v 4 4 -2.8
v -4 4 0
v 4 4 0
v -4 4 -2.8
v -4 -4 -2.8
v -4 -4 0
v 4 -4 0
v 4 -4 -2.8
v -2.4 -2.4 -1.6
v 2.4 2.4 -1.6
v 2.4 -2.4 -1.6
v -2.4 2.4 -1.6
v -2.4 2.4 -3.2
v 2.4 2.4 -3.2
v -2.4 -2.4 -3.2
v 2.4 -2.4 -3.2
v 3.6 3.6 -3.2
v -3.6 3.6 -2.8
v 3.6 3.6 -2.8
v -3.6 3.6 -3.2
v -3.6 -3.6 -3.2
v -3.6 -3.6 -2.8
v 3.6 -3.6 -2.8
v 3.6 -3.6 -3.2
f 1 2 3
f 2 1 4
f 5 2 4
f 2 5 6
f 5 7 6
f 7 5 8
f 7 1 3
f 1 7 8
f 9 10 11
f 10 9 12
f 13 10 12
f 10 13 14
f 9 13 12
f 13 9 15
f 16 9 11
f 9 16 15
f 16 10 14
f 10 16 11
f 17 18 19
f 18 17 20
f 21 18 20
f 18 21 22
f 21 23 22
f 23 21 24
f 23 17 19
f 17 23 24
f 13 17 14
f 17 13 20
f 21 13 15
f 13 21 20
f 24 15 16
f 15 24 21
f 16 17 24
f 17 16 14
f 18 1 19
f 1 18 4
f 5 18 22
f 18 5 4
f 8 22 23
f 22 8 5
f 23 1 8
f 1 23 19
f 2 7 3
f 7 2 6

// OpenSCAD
// file: ../p/box5.scad
use <../lib.scad>
function ldraw_lib__box5() = [
// 0 Box with 5 Faces and All Edges
// 0 Name: box5.dat
// 0 Author: James Jessiman
// 0 !LDRAW_ORG Primitive UPDATE 2012-01
// 0 !LICENSE Licensed under CC BY 4.0 : see CAreadme.txt
// 
// 0 BFC CERTIFY CCW
  [0,"BFC","CERTIFY"],
  [0,"BFC","CCW"],
// 
// 0 !HISTORY 2002-04-03 [sbliss] Modified for BFC compliance
// 0 !HISTORY 2002-04-25 [PTadmin] Official Update 2002-02
// 0 !HISTORY 2007-06-24 [PTadmin] Header formatted for Contributor Agreement
// 0 !HISTORY 2008-07-01 [PTadmin] Official Update 2008-01
// 0 !HISTORY 2012-02-16 [Philo] Changed to CCW
// 0 !HISTORY 2012-03-30 [PTadmin] Official Update 2012-01
// 
// 
// 2 24 1 1 1 -1 1 1
  [2,24,1,1,1,-1,1,1],
// 2 24 -1 1 1 -1 1 -1
  [2,24,-1,1,1,-1,1,-1],
// 2 24 -1 1 -1 1 1 -1
  [2,24,-1,1,-1,1,1,-1],
// 2 24 1 1 -1 1 1 1
  [2,24,1,1,-1,1,1,1],
// 2 24 1 0 1 -1 0 1
  [2,24,1,0,1,-1,0,1],
// 2 24 -1 0 1 -1 0 -1
  [2,24,-1,0,1,-1,0,-1],
// 2 24 -1 0 -1 1 0 -1
  [2,24,-1,0,-1,1,0,-1],
// 2 24 1 0 -1 1 0 1
  [2,24,1,0,-1,1,0,1],
// 2 24 1 0 1 1 1 1
  [2,24,1,0,1,1,1,1],
// 2 24 -1 0 1 -1 1 1
  [2,24,-1,0,1,-1,1,1],
// 2 24 1 0 -1 1 1 -1
  [2,24,1,0,-1,1,1,-1],
// 2 24 -1 0 -1 -1 1 -1
  [2,24,-1,0,-1,-1,1,-1],
// 4 16 -1 1 1 1 1 1 1 1 -1 -1 1 -1
  [4,16,-1,1,1,1,1,1,1,1,-1,-1,1,-1],
// 4 16 -1 1 1 -1 0 1 1 0 1 1 1 1
  [4,16,-1,1,1,-1,0,1,1,0,1,1,1,1],
// 4 16 -1 1 -1 -1 0 -1 -1 0 1 -1 1 1
  [4,16,-1,1,-1,-1,0,-1,-1,0,1,-1,1,1],
// 4 16 1 1 -1 1 0 -1 -1 0 -1 -1 1 -1
  [4,16,1,1,-1,1,0,-1,-1,0,-1,-1,1,-1],
// 4 16 1 1 1 1 0 1 1 0 -1 1 1 -1
  [4,16,1,1,1,1,0,1,1,0,-1,1,1,-1],
];
module ldraw_lib__box5(step=0, col=false, unit=2/5, alt=false, line=0.2, solid=!$preview)
    makepoly(ldraw_lib__box5(), step=step, col=col, unit=unit, alt=alt, line=line, solid=solid);
ldraw_lib__box5(line=0.2);
// file: ../p/box4.scad
use <../lib.scad>
function ldraw_lib__box4() = [
// 0 Box with 4 Faces (2 Parallel Pairs) and All Edges
// 0 Name: box4.dat
// 0 Author: James Jessiman
// 0 !LDRAW_ORG Primitive UPDATE 2012-01
// 0 !LICENSE Licensed under CC BY 4.0 : see CAreadme.txt
// 
// 0 BFC CERTIFY CCW
  [0,"BFC","CERTIFY"],
  [0,"BFC","CCW"],
// 
// 0 !HISTORY 2002-04-03 [sbliss] Modified for BFC compliance
// 0 !HISTORY 2002-04-25 [PTadmin] Official Update 2002-02
// 0 !HISTORY 2007-06-24 [PTadmin] Header formatted for Contributor Agreement
// 0 !HISTORY 2008-07-01 [PTadmin] Official Update 2008-01
// 0 !HISTORY 2012-02-16 [Philo] Changed to CCW
// 0 !HISTORY 2012-03-30 [PTadmin] Official Update 2012-01
// 
// 
// 2 24 1 1 1 -1 1 1
  [2,24,1,1,1,-1,1,1],
// 2 24 -1 1 1 -1 1 -1
  [2,24,-1,1,1,-1,1,-1],
// 2 24 -1 1 -1 1 1 -1
  [2,24,-1,1,-1,1,1,-1],
// 2 24 1 1 -1 1 1 1
  [2,24,1,1,-1,1,1,1],
// 2 24 1 0 1 -1 0 1
  [2,24,1,0,1,-1,0,1],
// 2 24 -1 0 1 -1 0 -1
  [2,24,-1,0,1,-1,0,-1],
// 2 24 -1 0 -1 1 0 -1
  [2,24,-1,0,-1,1,0,-1],
// 2 24 1 0 -1 1 0 1
  [2,24,1,0,-1,1,0,1],
// 2 24 1 0 1 1 1 1
  [2,24,1,0,1,1,1,1],
// 2 24 -1 0 1 -1 1 1
  [2,24,-1,0,1,-1,1,1],
// 2 24 1 0 -1 1 1 -1
  [2,24,1,0,-1,1,1,-1],
// 2 24 -1 0 -1 -1 1 -1
  [2,24,-1,0,-1,-1,1,-1],
// 4 16 -1 1 1 -1 0 1 1 0 1 1 1 1
  [4,16,-1,1,1,-1,0,1,1,0,1,1,1,1],
// 4 16 -1 1 -1 -1 0 -1 -1 0 1 -1 1 1
  [4,16,-1,1,-1,-1,0,-1,-1,0,1,-1,1,1],
// 4 16 1 1 -1 1 0 -1 -1 0 -1 -1 1 -1
  [4,16,1,1,-1,1,0,-1,-1,0,-1,-1,1,-1],
// 4 16 1 1 1 1 0 1 1 0 -1 1 1 -1
  [4,16,1,1,1,1,0,1,1,0,-1,1,1,-1],
];
module ldraw_lib__box4(step=0, col=false, unit=2/5, alt=false, line=0.2, solid=!$preview)
    makepoly(ldraw_lib__box4(), step=step, col=col, unit=unit, alt=alt, line=line, solid=solid);
ldraw_lib__box4(line=0.2);
// file: s/3070bs01.scad
use <../../lib.scad>
use <../../p/box4.scad>
use <../../p/box5.scad>
function ldraw_lib__s__3070bs01() = [
// 0 ~Tile  1 x  1 with Groove without Top Face
// 0 Name: s\3070bs01.dat
// 0 Author: Chris Dee [cwdee]
// 0 !LDRAW_ORG Subpart UPDATE 2009-02
// 0 !LICENSE Licensed under CC BY 4.0 : see CAreadme.txt
// 
// 0 BFC CERTIFY CCW
  [0,"BFC","CERTIFY"],
  [0,"BFC","CCW"],
// 
// 0 !HISTORY 2009-09-03 [PTadmin] Official Update 2009-02
// 
// 
// 1 16 0 0 0 10 0 0 0 7 0 0 0 10 box4.dat
  [1,16,0,0,0,10,0,0,0,7,0,0,0,10, ldraw_lib__box4()],
// 0 BFC INVERTNEXT
  [0,"BFC","INVERTNEXT"],
// 1 16 0 8 0 6 0 0 0 -4 0 0 0 6 box5.dat
  [1,16,0,8,0,6,0,0,0,-4,0,0,0,6, ldraw_lib__box5()],
// 1 16 0 7 0 9 0 0 0 1 0 0 0 9 box4.dat
  [1,16,0,7,0,9,0,0,0,1,0,0,0,9, ldraw_lib__box4()],
// 
// 4 16 9 8 9 6 8 6 -6 8 6 -9 8 9
  [4,16,9,8,9,6,8,6,-6,8,6,-9,8,9],
// 4 16 -9 8 9 -6 8 6 -6 8 -6 -9 8 -9
  [4,16,-9,8,9,-6,8,6,-6,8,-6,-9,8,-9],
// 4 16 -9 8 -9 -6 8 -6 6 8 -6 9 8 -9
  [4,16,-9,8,-9,-6,8,-6,6,8,-6,9,8,-9],
// 4 16 9 8 -9 6 8 -6 6 8 6 9 8 9
  [4,16,9,8,-9,6,8,-6,6,8,6,9,8,9],
// 
// 4 16 10 7 10 9 7 9 -9 7 9 -10 7 10
  [4,16,10,7,10,9,7,9,-9,7,9,-10,7,10],
// 4 16 -10 7 10 -9 7 9 -9 7 -9 -10 7 -10
  [4,16,-10,7,10,-9,7,9,-9,7,-9,-10,7,-10],
// 4 16 -10 7 -10 -9 7 -9 9 7 -9 10 7 -10
  [4,16,-10,7,-10,-9,7,-9,9,7,-9,10,7,-10],
// 4 16 10 7 -10 9 7 -9 9 7 9 10 7 10
  [4,16,10,7,-10,9,7,-9,9,7,9,10,7,10],
// 0
];
module ldraw_lib__s__3070bs01(step=0, col=false, unit=2/5, alt=false, line=0.2, solid=!$preview)
    makepoly(ldraw_lib__s__3070bs01(), step=step, col=col, unit=unit, alt=alt, line=line, solid=solid);
ldraw_lib__s__3070bs01(line=0.2);
// file: 3070b.scad
use <../lib.scad>
use <s/3070bs01.scad>
function ldraw_lib__3070b() = [
// 0 Tile  1 x  1 with Groove
// 0 Name: 3070b.dat
// 0 Author: Chris Dee [cwdee]
// 0 !LDRAW_ORG Part UPDATE 2009-02
// 0 !LICENSE Licensed under CC BY 4.0 : see CAreadme.txt
// 
// 0 BFC CERTIFY CW
  [0,"BFC","CERTIFY"],
  [0,"BFC","CW"],
// 
// 0 !HISTORY 2009-09-03 [PTadmin] Official Update 2009-02
// 
// 
// 1 16 0 0 0 1 0 0 0 1 0 0 0 1 s\3070bs01.dat
  [1,16,0,0,0,1,0,0,0,1,0,0,0,1, ldraw_lib__s__3070bs01()],
// 4 16 10 0 10 10 0 -10 -10 0 -10 -10 0 10
  [4,16,10,0,10,10,0,-10,-10,0,-10,-10,0,10],
// 0
];
module ldraw_lib__3070b(step=0, col=false, unit=2/5, alt=false, line=0.2, solid=!$preview)
    makepoly(ldraw_lib__3070b(), step=step, col=col, unit=unit, alt=alt, line=line, solid=solid);
ldraw_lib__3070b(line=0.2);
// main file
use <../lib.scad>
use <3070b.scad>
function ldraw_lib__30039() = [
// 0 =Tile  1 x  1 with Groove
// 0 Name: 30039.dat
// 0 Author: Chris Dee [cwdee]
// 0 !LDRAW_ORG Part Alias UPDATE 2013-02
// 0 !LICENSE Licensed under CC BY 4.0 : see CAreadme.txt
// 
// 0 !HELP Part 30039 is the counterpart of 3070b. Visually, the two parts seem
// 0 !HELP identical. This file is provided to make it easier to locate part files
// 0 !HELP when using the numbers from other sources.
// 0 !HELP 3070b is used for moulding opaque parts, 30039 for transparent parts.
// 
// 0 BFC CERTIFY CW
  [0,"BFC","CERTIFY"],
  [0,"BFC","CW"],
// 
// 0 !HISTORY 2005-12-28 [PTadmin] Official Update 2005-01
// 0 !HISTORY 2007-10-24 [PTadmin] Header formatted for Contributor Agreement
// 0 !HISTORY 2008-07-01 [PTadmin] Official Update 2008-01
// 0 !HISTORY 2008-07-07 [mikeheide] BFC'ed (2007-08-11)
// 0 !HISTORY 2009-12-29 [PTadmin] Official Update 2009-03
// 0 !HISTORY 2013-12-14 [cwdee] Add = prefix
// 0 !HISTORY 2013-12-23 [PTadmin] Official Update 2013-02
// 
// 
// 1 16 0 0 0 1 0 0 0 1 0 0 0 1 3070b.dat
  [1,16,0,0,0,1,0,0,0,1,0,0,0,1, ldraw_lib__3070b()],
// 0
];
module ldraw_lib__30039(step=0, col=false, unit=2/5, alt=false, line=0.2, solid=!$preview)
    makepoly(ldraw_lib__30039(), step=step, col=col, unit=unit, alt=alt, line=line, solid=solid);
ldraw_lib__30039(line=0.2);
